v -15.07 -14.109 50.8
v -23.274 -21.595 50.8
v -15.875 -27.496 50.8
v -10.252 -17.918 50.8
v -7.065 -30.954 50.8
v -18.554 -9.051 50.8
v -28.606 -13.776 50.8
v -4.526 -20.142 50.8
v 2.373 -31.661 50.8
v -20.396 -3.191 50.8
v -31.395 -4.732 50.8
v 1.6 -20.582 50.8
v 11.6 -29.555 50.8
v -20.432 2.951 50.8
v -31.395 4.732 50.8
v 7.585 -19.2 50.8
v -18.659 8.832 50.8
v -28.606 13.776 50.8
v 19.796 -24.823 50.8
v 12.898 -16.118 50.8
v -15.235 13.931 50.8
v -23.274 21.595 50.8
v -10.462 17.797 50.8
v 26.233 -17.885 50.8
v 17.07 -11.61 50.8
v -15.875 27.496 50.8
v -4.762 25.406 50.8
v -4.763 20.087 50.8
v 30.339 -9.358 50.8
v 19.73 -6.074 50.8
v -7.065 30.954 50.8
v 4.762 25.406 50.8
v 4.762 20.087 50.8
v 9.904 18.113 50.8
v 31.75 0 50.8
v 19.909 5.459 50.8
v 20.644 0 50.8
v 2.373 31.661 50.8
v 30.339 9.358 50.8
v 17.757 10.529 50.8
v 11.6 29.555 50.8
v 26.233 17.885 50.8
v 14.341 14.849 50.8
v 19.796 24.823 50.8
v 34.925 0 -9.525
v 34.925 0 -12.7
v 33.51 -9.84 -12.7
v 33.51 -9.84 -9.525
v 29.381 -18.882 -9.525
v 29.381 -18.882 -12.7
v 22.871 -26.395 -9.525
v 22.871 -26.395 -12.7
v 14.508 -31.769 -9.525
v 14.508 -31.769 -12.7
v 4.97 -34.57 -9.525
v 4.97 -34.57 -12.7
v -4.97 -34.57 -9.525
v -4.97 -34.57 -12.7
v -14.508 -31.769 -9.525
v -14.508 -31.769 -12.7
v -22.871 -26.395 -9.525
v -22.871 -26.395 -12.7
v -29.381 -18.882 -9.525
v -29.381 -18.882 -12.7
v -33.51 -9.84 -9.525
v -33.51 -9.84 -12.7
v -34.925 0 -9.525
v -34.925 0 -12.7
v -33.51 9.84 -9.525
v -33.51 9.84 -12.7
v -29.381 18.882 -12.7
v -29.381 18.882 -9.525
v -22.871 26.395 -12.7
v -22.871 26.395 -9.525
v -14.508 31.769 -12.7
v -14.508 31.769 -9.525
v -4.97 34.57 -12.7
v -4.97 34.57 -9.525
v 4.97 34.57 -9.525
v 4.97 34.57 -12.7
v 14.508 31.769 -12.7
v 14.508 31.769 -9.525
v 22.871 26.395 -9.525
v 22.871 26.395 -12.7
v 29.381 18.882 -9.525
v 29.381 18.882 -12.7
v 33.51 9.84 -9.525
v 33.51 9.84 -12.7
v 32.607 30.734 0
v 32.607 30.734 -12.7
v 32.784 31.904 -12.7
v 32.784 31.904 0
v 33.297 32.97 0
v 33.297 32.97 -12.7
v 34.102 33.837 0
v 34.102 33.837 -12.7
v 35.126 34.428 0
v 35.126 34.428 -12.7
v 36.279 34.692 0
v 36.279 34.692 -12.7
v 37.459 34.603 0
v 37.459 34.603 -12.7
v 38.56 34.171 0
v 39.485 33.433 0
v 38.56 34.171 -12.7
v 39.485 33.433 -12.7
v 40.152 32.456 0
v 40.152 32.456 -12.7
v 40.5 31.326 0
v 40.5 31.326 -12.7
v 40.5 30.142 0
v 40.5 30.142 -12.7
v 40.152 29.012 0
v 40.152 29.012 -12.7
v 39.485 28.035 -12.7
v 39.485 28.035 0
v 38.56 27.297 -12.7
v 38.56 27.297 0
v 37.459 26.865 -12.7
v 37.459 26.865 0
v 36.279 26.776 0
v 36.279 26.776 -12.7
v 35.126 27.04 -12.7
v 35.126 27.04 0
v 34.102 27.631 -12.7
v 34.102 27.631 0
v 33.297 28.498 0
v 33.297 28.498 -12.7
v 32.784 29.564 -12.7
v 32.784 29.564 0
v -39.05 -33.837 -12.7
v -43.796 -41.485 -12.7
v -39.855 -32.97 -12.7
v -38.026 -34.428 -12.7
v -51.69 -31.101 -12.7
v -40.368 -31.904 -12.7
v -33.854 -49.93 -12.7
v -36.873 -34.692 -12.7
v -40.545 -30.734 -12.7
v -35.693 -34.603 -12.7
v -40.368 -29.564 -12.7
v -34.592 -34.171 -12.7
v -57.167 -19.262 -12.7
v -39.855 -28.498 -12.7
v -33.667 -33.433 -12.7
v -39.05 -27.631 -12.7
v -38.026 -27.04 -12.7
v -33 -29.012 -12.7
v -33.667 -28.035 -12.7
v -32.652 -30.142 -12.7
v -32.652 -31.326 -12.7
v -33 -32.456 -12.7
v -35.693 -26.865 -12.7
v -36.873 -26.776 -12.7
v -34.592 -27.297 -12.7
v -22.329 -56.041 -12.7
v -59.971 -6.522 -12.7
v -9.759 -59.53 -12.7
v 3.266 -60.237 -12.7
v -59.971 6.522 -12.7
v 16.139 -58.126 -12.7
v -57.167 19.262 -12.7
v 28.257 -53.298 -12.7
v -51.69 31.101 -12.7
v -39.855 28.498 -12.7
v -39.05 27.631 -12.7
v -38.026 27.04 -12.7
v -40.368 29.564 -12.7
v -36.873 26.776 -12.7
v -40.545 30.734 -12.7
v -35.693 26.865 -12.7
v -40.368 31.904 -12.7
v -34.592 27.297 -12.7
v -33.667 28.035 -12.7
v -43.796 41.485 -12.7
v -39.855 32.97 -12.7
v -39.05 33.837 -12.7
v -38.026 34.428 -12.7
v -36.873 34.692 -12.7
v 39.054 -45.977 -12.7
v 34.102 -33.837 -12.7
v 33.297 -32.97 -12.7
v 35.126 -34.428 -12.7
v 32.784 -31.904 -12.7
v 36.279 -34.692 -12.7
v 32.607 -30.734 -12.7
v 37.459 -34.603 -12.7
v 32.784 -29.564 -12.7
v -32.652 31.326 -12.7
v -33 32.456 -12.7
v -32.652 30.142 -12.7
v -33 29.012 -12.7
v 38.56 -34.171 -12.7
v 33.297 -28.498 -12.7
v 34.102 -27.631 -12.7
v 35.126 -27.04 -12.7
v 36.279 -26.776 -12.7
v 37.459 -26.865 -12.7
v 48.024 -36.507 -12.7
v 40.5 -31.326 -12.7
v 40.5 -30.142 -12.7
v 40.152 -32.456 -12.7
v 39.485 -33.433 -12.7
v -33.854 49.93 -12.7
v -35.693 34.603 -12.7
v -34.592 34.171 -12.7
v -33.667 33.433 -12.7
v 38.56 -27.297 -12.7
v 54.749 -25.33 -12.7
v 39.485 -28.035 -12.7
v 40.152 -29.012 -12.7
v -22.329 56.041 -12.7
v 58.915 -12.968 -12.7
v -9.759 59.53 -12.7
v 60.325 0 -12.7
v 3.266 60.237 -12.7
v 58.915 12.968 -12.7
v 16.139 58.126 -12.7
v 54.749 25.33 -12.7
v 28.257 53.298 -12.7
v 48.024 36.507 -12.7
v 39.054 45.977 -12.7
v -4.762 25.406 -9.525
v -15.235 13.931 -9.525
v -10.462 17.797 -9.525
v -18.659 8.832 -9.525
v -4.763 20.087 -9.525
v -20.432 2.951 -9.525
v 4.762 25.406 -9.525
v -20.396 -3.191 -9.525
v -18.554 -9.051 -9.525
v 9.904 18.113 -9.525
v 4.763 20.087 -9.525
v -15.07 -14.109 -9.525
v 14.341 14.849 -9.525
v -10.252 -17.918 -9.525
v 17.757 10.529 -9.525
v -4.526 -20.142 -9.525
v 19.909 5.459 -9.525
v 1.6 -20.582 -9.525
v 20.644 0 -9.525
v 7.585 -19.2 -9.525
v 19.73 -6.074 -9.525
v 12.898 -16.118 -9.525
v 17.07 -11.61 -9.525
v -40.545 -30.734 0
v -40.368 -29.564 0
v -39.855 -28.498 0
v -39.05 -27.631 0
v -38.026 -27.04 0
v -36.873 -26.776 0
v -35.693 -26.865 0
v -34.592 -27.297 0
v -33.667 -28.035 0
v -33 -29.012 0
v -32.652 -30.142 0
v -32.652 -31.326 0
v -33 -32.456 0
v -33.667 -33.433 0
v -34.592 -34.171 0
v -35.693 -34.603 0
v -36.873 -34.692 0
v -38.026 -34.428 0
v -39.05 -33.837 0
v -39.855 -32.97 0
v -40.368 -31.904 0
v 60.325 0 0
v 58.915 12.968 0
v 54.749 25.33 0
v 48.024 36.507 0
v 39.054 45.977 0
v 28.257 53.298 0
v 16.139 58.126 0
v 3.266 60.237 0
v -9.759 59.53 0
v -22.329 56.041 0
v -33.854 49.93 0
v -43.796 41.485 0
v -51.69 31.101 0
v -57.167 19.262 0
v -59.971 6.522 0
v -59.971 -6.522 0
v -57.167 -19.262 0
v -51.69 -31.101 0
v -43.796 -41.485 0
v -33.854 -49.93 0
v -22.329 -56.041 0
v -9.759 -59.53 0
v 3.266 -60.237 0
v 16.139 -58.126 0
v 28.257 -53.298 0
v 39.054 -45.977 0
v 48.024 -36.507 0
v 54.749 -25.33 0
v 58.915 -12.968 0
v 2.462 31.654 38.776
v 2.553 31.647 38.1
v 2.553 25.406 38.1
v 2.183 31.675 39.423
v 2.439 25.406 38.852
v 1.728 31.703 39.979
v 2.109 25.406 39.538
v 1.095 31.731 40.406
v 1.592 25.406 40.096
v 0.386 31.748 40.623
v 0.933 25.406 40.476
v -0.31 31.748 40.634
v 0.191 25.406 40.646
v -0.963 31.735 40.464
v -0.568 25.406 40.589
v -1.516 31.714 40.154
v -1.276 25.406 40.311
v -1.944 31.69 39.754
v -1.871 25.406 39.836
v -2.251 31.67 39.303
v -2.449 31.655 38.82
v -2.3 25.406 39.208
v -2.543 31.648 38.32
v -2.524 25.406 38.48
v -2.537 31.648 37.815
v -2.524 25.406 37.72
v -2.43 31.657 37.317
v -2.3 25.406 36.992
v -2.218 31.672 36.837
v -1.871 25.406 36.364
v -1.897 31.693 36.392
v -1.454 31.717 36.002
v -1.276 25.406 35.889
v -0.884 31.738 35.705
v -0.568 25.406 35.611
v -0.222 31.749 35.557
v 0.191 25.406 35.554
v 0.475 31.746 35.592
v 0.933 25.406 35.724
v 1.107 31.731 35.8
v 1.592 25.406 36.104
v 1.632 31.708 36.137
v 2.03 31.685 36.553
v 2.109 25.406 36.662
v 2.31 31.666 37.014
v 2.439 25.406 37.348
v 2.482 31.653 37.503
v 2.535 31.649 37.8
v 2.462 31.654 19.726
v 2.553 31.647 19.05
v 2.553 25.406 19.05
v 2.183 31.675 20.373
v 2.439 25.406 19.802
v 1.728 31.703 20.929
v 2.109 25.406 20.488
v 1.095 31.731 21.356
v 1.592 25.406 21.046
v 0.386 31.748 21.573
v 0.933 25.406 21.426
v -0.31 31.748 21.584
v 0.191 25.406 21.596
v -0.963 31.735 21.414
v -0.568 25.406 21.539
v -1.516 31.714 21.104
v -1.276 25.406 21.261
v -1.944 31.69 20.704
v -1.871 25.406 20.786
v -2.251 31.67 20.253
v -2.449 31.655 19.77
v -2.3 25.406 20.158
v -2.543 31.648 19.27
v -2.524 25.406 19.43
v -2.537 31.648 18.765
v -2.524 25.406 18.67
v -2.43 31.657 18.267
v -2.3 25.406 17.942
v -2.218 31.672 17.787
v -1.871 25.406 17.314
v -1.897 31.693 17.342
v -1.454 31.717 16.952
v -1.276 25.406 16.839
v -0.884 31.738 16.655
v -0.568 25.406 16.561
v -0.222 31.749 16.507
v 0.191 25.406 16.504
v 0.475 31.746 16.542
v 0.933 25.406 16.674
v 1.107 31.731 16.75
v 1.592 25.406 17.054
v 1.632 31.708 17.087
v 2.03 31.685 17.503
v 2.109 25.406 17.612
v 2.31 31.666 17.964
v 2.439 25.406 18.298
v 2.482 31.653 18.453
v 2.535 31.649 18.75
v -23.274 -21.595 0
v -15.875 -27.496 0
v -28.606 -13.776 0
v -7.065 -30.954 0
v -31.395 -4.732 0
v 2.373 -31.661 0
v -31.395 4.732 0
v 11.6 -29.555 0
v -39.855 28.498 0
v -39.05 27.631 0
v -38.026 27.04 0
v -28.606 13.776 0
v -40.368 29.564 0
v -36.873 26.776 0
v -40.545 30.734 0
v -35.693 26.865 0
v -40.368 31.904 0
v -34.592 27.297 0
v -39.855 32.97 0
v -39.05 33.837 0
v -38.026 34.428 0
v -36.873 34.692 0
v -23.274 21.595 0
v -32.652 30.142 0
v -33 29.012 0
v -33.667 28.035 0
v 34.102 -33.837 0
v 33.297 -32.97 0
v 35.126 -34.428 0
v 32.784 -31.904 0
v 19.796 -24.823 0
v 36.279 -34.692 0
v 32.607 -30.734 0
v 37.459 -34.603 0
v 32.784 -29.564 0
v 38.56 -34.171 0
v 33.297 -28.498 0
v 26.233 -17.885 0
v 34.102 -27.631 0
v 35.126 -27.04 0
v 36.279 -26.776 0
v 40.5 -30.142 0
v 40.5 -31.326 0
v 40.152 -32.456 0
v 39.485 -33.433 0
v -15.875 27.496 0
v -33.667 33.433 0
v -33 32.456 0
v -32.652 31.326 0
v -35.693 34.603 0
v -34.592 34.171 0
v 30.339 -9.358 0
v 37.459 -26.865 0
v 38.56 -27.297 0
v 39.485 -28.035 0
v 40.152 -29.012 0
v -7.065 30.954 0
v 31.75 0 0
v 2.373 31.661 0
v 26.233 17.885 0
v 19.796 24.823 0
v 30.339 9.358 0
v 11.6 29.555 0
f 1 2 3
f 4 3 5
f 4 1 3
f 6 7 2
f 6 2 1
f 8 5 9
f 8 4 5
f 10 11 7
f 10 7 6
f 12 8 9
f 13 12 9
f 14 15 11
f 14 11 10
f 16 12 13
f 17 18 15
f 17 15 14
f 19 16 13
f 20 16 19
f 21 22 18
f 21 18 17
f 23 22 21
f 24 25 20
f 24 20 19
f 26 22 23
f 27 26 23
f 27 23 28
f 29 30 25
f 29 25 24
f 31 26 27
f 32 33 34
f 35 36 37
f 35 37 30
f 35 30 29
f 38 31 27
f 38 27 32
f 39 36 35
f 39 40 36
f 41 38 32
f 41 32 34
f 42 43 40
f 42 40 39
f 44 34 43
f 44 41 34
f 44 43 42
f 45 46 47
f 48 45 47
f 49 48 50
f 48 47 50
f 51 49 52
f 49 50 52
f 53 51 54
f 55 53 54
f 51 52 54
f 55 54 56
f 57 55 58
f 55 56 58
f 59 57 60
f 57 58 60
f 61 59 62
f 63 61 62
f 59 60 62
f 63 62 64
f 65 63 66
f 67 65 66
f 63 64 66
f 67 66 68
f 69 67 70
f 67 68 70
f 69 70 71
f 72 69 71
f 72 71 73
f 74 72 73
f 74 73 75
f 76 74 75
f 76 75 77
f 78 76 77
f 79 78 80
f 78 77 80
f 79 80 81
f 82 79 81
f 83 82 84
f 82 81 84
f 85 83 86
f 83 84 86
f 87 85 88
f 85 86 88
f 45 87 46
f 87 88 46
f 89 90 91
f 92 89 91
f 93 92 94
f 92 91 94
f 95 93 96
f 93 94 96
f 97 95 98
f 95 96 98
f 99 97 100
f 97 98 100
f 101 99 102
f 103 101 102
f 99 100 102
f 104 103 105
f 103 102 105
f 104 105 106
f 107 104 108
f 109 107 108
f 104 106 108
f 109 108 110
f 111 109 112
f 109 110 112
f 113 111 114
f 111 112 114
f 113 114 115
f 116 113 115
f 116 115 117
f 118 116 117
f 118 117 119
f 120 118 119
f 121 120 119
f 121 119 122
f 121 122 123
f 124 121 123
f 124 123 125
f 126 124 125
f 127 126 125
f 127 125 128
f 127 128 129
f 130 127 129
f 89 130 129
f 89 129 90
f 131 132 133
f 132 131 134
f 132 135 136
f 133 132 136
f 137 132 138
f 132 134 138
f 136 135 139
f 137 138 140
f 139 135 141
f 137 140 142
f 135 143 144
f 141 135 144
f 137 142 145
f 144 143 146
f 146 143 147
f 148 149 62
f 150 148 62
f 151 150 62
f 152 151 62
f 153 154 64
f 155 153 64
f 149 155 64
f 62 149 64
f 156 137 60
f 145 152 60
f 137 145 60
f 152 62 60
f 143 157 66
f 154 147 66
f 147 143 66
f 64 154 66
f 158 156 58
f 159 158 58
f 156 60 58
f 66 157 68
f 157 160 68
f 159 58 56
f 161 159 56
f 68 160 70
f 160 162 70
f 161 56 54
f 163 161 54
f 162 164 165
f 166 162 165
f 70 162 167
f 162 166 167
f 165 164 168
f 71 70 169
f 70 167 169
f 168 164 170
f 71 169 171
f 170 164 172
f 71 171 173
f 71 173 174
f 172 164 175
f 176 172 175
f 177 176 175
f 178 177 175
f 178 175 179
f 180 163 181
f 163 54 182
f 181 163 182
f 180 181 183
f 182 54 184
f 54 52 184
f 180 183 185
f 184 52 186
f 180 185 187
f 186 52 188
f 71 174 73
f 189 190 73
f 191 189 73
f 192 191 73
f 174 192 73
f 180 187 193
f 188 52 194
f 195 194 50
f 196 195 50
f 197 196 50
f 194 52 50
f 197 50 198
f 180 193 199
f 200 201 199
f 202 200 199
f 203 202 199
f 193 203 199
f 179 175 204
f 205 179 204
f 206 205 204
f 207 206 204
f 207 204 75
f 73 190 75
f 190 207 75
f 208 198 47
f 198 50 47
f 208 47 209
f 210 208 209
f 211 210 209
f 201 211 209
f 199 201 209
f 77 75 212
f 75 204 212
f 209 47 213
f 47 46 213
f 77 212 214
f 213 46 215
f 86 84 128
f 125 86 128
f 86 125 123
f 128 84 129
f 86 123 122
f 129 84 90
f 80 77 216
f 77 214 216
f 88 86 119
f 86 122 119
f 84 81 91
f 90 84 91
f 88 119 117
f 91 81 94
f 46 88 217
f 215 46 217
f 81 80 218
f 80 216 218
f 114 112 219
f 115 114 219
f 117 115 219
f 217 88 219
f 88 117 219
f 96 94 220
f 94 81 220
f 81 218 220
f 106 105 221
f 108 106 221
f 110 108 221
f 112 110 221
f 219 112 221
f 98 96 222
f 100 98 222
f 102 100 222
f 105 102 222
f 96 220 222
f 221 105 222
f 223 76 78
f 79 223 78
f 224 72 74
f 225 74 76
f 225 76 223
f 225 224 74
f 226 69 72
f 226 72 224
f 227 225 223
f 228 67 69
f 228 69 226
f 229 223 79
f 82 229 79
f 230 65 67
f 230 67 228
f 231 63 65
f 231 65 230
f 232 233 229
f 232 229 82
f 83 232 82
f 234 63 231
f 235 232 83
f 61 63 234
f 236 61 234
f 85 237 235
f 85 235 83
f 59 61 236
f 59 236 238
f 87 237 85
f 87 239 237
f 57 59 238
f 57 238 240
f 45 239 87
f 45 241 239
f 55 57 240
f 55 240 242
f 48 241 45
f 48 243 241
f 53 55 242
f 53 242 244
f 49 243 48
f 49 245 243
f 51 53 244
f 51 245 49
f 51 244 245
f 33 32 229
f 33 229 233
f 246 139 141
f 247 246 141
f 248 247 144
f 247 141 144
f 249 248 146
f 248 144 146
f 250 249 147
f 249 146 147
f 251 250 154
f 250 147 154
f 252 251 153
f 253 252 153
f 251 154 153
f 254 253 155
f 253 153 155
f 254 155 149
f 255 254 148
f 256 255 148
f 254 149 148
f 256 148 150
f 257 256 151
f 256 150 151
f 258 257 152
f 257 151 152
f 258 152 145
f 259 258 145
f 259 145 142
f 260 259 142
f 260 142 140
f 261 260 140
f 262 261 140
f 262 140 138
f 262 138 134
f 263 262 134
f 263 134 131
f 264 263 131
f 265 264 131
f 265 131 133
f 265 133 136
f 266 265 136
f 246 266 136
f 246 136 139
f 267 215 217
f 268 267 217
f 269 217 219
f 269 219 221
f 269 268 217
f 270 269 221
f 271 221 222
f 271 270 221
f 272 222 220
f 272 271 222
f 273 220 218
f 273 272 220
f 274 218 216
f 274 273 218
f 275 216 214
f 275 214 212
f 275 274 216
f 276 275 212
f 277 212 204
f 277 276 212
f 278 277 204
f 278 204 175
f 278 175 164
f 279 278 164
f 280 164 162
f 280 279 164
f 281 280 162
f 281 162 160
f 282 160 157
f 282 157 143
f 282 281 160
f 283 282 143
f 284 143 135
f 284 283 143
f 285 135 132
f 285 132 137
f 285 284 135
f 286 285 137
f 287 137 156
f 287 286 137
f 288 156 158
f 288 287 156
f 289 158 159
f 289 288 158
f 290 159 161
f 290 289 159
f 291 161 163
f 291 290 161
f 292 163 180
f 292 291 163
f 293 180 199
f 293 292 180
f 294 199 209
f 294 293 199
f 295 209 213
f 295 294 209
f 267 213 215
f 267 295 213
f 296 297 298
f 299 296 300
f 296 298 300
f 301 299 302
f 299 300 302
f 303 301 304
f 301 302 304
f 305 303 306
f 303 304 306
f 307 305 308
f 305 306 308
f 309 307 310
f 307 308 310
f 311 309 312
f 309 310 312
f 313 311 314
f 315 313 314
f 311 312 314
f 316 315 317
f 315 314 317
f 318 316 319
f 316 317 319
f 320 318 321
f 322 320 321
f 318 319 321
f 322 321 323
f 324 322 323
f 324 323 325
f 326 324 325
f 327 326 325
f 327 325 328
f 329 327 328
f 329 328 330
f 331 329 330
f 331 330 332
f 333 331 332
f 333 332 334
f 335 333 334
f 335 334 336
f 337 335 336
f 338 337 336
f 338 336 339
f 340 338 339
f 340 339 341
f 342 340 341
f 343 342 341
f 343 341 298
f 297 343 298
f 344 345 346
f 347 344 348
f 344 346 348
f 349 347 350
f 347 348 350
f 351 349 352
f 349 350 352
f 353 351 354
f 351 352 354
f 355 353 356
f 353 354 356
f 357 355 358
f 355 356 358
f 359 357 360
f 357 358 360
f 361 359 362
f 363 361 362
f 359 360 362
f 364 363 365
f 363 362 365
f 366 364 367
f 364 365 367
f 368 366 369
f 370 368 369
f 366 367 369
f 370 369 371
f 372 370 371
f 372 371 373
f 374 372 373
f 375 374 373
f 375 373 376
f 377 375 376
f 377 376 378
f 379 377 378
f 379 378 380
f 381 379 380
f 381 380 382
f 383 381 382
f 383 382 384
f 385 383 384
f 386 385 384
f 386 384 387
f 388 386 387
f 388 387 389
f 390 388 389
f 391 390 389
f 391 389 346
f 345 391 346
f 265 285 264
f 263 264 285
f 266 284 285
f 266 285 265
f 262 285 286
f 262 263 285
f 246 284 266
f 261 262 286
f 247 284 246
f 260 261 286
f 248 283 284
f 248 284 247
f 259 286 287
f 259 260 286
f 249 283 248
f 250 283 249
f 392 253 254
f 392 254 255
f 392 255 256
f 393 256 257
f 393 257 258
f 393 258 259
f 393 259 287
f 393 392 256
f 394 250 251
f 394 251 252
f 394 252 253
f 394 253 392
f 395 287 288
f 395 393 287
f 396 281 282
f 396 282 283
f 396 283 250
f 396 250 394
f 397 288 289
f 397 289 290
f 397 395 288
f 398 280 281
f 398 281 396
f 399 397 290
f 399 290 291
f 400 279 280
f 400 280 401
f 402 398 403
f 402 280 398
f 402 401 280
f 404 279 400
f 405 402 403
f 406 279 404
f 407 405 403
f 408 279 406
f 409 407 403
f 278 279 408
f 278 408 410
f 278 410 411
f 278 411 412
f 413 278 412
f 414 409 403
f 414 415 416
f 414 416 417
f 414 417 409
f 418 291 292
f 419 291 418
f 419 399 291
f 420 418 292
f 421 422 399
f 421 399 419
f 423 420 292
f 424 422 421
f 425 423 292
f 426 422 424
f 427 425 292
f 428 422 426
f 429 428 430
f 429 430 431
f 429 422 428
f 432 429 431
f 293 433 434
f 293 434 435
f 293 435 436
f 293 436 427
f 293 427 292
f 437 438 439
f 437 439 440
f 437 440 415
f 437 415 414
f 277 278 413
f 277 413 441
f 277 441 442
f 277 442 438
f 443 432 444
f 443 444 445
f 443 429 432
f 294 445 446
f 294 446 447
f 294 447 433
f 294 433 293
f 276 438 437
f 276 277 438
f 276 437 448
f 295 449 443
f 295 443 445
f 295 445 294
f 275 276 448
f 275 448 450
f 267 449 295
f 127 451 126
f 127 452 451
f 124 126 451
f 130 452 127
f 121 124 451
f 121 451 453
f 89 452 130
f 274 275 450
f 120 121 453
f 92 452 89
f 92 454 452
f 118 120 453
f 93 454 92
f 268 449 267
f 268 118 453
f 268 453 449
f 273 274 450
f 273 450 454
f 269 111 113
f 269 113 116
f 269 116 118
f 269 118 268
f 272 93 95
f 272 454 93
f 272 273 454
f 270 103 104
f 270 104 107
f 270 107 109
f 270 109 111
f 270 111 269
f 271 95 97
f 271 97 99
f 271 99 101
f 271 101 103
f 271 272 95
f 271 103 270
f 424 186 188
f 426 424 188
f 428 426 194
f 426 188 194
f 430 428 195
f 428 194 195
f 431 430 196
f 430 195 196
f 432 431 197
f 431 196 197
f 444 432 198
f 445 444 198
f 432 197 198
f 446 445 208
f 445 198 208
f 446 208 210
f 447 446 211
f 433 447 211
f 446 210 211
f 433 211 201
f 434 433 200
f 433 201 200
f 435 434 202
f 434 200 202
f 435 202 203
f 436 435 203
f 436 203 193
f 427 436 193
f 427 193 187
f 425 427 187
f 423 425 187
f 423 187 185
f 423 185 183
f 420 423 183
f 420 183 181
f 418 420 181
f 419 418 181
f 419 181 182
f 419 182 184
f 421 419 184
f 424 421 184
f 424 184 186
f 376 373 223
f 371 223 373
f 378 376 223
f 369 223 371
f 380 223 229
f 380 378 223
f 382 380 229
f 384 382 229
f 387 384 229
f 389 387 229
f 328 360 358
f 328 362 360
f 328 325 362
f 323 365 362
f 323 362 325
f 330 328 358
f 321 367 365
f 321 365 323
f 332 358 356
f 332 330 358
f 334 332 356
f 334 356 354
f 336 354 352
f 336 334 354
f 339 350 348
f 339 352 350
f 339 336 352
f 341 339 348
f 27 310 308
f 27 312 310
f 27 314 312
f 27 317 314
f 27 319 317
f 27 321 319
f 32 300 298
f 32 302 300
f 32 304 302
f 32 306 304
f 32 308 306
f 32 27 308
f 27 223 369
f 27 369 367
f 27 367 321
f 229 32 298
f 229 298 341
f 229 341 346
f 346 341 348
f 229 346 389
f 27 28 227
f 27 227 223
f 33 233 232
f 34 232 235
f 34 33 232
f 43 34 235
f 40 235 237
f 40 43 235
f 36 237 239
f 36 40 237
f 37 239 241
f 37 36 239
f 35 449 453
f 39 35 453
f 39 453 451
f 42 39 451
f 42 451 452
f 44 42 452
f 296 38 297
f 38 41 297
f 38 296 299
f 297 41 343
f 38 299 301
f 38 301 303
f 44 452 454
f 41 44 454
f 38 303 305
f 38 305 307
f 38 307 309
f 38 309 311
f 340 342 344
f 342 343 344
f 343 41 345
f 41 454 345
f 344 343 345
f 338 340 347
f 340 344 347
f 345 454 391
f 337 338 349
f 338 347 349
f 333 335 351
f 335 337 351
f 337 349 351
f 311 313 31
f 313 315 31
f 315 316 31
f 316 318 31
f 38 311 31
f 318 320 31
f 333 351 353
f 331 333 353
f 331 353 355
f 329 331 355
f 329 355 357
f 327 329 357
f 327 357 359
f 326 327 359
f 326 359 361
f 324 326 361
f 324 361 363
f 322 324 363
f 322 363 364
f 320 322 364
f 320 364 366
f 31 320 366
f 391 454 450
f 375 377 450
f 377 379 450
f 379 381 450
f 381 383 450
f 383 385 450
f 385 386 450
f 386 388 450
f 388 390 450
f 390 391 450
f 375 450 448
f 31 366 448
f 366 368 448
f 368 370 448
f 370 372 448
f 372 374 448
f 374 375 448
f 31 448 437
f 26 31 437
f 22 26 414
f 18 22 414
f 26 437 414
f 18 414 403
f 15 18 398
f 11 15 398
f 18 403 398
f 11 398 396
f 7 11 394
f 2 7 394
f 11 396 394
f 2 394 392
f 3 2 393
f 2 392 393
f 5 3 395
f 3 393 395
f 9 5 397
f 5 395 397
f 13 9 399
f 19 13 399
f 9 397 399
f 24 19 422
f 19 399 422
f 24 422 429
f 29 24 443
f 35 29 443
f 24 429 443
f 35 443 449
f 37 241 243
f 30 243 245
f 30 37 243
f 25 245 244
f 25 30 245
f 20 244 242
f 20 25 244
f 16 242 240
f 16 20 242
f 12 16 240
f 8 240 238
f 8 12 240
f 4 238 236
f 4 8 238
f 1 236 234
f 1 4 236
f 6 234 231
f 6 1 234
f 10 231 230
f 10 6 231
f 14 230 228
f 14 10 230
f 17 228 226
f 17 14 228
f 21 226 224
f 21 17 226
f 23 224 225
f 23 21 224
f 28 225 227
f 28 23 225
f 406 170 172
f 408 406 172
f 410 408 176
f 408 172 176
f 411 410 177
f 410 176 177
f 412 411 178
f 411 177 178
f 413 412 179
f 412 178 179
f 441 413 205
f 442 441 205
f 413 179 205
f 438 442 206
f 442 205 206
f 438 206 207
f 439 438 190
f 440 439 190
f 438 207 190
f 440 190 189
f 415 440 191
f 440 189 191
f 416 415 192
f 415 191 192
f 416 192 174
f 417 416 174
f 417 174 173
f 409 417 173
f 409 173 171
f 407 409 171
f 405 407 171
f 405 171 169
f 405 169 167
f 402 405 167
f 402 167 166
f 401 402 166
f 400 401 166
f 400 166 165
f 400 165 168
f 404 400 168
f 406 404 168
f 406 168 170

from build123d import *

# Parameters (mm, degrees)
F0_R     = 31.75
F1_DEPTH = 50.8
F0_R_2   = 60.325
F2_DEPTH = 12.7
F4_D     = 5.1054
F4_DEPTH = 60.326
F5_R     = 34.925
F6_DEPTH = 3.175
F7_D     = 7.9375


with BuildPart() as f1:
    # F0 (on Top) → F1 (new body)
    with BuildSketch(Plane.XY):
        Circle(F0_R)
        with BuildLine():
            ThreePointArc((4.7625, 20.0869892361), (16.1939012972, 12.80336298), (20.64385, 0))
            ThreePointArc((20.64385, 0), (-12.80336298, -16.1939012972), (-4.7625, 20.0869892361))
            Line((-4.7625, 20.0869892361), (-4.7625, 25.40635))
            Line((-4.7625, 25.40635), (4.7625, 25.40635))
            Line((4.7625, 25.40635), (4.7625, 20.0869892361))
        make_face(mode=Mode.SUBTRACT)
    extrude(amount=F1_DEPTH)

    # F0 (on Top) → F2 (join)
    with BuildSketch(Plane.XY):
        Circle(F0_R_2)
        Circle(F0_R, mode=Mode.SUBTRACT)
        Circle(F0_R)
        with BuildLine():
            ThreePointArc((4.7625, 20.0869892361), (16.1939012972, 12.80336298), (20.64385, 0))
            ThreePointArc((20.64385, 0), (-12.80336298, -16.1939012972), (-4.7625, 20.0869892361))
            Line((-4.7625, 20.0869892361), (-4.7625, 25.40635))
            Line((-4.7625, 25.40635), (4.7625, 25.40635))
            Line((4.7625, 25.40635), (4.7625, 20.0869892361))
        make_face(mode=Mode.SUBTRACT)
    extrude(amount=-F2_DEPTH)

    # F4 (through all, one way)
    with BuildSketch(Plane.XZ):
        with Locations((0, 38.1), (0, 19.05)):
            Circle(F4_D / 2)
    extrude(amount=-F4_DEPTH, mode=Mode.SUBTRACT)

    # F5 (on face) → F6 (cut)
    with BuildSketch(Plane(origin=(0, 0, -12.7), x_dir=(1, 0, 0), z_dir=(0, 0, -1))):
        Circle(F5_R)
        with BuildLine():
            ThreePointArc((-4.7625, -20.0869892361), (0, 20.64385), (4.7625, -20.0869892361))
            Line((4.7625, -20.0869892361), (4.7625, -25.40635))
            Line((4.7625, -25.40635), (-4.7625, -25.40635))
            Line((-4.7625, -25.40635), (-4.7625, -20.0869892361))
        make_face(mode=Mode.SUBTRACT)
    extrude(amount=-F6_DEPTH, mode=Mode.SUBTRACT)

    # F7 (through all)
    with Locations(Plane.XY):
        with Locations((-36.576, -30.734), (36.576, -30.734), (36.576, 30.734), (-36.576, 30.734)):
            Hole(F7_D / 2)


solid = f1.part
